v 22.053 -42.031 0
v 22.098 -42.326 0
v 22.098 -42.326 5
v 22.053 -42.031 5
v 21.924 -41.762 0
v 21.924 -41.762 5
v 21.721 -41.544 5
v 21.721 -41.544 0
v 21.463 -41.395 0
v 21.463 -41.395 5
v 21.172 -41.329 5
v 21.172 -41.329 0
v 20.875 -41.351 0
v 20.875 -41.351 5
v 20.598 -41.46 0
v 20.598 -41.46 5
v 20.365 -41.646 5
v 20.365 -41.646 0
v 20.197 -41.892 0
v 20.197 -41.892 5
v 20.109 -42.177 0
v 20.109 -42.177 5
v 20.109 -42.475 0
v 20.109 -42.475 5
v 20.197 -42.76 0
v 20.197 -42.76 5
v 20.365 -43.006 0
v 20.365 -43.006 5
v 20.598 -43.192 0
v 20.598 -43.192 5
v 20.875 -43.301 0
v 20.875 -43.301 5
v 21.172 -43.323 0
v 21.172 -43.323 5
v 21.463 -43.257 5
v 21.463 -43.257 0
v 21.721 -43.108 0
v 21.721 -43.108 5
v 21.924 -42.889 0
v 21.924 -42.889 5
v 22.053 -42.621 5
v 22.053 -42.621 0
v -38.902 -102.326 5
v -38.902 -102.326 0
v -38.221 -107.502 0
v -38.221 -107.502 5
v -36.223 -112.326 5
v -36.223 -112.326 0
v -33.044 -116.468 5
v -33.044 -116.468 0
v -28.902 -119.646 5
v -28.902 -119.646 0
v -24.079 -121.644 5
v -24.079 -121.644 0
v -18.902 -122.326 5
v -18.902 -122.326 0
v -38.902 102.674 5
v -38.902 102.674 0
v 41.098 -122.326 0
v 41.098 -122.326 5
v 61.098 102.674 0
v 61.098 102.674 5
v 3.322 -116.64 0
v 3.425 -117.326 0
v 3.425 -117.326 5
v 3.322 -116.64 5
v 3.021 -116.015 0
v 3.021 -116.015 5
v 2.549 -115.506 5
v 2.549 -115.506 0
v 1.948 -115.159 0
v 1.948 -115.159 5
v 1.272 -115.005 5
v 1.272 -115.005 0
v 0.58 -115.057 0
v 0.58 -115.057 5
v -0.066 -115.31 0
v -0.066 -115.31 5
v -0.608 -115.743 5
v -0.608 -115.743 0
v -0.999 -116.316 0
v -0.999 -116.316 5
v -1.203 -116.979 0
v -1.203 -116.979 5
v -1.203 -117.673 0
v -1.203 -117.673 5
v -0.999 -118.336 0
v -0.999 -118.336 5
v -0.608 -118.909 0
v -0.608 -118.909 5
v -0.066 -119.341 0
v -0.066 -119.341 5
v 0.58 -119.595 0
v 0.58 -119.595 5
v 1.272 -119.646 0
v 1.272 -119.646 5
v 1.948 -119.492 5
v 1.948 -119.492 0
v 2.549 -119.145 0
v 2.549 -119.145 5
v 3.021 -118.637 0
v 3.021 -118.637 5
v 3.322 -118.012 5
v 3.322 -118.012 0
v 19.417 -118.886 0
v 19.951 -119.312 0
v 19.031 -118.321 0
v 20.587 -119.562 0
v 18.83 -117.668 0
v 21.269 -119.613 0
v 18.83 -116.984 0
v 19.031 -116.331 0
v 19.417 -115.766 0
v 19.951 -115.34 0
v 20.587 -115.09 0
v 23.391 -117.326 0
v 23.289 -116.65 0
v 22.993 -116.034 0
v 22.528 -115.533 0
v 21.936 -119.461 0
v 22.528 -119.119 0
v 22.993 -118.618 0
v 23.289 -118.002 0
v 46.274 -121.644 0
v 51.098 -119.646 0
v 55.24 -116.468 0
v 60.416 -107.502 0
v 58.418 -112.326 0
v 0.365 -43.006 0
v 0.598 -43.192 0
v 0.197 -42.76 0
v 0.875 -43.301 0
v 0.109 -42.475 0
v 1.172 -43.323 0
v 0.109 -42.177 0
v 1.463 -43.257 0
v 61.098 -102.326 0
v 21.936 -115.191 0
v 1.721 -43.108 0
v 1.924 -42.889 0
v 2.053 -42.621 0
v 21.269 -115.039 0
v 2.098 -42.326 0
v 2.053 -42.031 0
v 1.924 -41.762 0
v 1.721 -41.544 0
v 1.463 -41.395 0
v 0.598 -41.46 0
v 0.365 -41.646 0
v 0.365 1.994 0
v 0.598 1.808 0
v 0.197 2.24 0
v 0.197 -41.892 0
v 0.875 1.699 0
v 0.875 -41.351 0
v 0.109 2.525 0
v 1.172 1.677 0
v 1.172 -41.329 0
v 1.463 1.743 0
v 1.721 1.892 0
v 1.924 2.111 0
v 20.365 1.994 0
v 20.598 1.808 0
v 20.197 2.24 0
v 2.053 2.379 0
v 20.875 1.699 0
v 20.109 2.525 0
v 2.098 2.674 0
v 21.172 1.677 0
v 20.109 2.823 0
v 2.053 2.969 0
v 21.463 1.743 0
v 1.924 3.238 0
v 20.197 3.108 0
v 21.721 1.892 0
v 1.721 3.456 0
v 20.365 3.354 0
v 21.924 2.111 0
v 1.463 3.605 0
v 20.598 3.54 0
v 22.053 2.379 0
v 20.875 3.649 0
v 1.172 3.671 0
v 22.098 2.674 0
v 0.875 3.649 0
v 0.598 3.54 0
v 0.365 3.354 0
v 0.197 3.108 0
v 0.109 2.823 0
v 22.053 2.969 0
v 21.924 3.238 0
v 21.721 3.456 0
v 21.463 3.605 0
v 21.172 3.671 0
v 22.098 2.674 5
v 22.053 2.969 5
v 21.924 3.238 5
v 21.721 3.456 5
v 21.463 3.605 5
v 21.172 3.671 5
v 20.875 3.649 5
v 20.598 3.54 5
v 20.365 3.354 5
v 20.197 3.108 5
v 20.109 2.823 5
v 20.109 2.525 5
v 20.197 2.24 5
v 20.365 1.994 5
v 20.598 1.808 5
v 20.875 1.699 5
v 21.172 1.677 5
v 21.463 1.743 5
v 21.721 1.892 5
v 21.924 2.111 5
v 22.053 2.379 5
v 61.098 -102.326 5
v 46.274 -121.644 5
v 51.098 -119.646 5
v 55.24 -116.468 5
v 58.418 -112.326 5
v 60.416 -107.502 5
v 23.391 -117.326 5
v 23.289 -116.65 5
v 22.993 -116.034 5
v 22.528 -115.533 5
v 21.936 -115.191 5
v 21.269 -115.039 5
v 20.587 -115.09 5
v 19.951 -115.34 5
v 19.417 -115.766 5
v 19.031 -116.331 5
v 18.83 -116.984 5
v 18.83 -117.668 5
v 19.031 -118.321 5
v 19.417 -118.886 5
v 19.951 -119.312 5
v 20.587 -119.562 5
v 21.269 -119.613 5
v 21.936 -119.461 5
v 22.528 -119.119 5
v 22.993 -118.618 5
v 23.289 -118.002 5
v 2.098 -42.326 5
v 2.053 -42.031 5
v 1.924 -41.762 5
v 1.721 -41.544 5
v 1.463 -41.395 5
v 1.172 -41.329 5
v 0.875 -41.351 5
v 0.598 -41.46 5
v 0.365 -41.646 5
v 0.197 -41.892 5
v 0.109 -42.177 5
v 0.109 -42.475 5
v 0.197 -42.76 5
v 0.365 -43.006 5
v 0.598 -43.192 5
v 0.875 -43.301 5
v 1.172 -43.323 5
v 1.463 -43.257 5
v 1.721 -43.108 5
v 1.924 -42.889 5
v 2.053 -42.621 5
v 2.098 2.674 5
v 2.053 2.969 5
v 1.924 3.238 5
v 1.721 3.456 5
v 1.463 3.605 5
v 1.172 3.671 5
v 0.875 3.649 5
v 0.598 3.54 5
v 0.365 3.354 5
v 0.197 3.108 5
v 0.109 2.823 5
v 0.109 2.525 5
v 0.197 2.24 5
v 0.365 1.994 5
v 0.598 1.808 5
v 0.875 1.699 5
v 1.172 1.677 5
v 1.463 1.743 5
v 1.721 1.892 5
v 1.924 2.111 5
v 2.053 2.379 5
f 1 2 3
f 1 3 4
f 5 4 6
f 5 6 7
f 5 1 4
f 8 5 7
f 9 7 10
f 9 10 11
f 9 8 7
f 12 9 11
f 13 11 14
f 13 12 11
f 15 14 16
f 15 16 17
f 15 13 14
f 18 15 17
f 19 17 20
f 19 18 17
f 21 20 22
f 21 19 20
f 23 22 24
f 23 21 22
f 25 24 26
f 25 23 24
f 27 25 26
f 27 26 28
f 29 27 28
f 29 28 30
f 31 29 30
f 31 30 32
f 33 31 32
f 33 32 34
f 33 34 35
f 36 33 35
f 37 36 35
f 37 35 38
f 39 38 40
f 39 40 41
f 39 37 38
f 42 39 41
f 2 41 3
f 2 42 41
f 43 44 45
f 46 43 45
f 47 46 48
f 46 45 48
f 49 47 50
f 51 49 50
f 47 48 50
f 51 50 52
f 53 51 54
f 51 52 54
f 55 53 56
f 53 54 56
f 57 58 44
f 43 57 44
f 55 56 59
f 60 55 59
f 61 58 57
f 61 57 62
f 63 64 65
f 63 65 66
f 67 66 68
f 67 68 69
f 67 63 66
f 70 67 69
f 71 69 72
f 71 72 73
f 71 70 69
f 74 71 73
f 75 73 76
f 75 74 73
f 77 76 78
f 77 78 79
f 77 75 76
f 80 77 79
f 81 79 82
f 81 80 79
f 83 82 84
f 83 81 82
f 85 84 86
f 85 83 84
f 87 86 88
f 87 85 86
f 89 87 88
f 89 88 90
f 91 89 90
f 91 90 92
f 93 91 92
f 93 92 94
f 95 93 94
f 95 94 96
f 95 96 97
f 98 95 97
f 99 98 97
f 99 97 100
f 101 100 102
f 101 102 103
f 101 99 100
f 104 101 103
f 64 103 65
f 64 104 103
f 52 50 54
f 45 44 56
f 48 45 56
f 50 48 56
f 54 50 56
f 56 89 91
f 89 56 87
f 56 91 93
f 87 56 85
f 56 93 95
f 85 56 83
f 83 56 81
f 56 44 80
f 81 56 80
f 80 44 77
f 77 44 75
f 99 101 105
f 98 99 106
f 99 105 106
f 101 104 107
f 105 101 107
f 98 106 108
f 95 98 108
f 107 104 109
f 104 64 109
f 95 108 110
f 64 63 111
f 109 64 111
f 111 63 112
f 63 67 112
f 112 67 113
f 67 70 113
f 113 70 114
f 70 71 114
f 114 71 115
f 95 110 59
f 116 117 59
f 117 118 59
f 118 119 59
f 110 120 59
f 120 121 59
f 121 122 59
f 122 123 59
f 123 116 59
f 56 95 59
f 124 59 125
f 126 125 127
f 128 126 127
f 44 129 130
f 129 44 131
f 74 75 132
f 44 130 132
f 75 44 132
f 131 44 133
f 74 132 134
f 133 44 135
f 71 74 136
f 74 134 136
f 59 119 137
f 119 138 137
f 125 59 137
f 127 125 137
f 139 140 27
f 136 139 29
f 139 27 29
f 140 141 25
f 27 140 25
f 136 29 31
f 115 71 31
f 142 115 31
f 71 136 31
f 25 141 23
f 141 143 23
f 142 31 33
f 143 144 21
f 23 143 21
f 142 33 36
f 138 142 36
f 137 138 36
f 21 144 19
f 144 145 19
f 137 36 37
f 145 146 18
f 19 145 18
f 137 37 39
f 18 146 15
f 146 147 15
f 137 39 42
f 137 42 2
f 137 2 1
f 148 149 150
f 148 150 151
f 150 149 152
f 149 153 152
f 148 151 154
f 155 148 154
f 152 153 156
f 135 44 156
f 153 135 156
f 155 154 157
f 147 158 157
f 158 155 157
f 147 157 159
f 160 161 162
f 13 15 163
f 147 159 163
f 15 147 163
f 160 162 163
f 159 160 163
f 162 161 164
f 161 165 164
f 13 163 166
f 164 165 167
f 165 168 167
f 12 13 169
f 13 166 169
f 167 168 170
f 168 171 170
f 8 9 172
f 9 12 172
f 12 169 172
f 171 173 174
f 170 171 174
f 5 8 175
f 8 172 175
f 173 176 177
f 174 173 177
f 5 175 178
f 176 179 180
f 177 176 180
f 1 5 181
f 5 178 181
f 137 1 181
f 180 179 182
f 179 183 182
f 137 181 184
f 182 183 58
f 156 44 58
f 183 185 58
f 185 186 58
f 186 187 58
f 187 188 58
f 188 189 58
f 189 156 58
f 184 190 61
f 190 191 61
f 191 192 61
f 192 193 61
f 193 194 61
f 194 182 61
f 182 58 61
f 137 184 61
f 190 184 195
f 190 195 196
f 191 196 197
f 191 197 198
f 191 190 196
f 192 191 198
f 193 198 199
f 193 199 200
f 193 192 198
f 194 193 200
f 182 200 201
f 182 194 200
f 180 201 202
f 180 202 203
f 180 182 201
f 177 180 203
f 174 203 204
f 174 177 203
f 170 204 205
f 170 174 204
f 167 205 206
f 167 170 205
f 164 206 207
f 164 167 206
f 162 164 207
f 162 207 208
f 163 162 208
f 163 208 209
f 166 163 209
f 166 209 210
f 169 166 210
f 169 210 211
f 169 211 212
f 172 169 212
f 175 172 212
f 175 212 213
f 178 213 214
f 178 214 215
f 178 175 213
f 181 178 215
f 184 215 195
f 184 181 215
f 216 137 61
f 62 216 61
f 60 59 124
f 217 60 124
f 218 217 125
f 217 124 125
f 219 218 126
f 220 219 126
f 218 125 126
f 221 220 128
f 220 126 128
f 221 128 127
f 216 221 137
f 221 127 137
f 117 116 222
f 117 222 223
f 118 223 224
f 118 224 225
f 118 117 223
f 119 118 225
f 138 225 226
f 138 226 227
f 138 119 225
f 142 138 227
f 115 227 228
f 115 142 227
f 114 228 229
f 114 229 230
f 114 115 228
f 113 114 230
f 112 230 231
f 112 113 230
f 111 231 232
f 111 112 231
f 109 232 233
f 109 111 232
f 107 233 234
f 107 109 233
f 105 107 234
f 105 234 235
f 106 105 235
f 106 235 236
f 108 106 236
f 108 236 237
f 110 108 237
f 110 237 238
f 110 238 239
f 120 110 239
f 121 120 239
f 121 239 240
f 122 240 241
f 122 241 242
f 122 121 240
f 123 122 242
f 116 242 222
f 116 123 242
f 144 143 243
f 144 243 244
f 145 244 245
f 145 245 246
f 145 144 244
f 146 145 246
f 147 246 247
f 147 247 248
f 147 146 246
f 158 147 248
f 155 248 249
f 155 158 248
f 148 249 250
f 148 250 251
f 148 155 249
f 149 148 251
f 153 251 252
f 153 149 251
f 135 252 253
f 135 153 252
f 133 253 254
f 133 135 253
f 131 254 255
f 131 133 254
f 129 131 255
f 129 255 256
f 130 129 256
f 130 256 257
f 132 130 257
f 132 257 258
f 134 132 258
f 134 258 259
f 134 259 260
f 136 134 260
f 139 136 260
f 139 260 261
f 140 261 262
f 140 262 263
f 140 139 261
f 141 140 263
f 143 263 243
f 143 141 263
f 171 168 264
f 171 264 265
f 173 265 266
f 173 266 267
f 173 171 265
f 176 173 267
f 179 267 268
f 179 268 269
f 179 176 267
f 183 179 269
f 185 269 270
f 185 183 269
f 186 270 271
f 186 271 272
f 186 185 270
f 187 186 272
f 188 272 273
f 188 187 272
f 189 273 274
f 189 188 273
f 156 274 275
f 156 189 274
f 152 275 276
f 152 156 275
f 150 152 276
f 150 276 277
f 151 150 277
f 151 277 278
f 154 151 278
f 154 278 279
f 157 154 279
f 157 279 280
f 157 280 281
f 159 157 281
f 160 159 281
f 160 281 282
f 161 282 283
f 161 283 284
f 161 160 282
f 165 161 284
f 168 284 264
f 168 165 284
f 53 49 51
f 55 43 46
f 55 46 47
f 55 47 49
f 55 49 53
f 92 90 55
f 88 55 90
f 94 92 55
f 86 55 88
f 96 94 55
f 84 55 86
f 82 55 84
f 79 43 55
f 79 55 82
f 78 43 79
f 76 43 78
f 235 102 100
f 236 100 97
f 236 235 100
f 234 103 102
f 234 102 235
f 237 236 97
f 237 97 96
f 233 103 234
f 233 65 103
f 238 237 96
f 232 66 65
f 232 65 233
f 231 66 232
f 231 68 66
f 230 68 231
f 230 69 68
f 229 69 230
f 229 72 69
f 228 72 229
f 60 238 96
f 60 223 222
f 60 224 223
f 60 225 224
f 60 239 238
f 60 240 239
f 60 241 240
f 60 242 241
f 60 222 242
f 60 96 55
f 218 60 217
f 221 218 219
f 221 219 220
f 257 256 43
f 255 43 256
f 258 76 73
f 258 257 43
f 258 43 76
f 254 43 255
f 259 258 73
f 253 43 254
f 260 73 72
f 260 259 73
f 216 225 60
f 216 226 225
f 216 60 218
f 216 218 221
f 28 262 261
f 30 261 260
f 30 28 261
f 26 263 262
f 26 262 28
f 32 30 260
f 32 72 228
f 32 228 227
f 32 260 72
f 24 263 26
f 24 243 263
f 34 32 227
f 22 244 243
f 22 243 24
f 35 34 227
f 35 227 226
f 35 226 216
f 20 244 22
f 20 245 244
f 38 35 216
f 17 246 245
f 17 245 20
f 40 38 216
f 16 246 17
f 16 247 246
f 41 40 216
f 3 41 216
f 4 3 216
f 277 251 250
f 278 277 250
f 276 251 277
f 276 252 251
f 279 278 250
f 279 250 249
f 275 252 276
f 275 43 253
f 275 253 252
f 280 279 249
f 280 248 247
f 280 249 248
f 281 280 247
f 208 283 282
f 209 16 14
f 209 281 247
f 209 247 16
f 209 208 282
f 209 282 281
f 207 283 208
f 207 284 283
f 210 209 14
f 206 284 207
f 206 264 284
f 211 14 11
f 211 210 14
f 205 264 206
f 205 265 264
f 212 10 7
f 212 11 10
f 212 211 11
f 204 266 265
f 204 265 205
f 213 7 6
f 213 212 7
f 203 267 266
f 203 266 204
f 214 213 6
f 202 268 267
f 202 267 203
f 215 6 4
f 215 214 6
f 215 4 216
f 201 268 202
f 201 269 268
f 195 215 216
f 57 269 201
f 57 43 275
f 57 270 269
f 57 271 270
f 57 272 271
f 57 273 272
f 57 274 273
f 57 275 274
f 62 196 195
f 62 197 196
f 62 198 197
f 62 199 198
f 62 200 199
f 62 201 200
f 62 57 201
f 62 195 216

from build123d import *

# Parameters (mm, degrees)
F0_W     = 100
F0_H     = 90
F0_H_2   = 95
F0_R     = 1
F0_R_2   = 2.327232
F0_R_3   = 2.29342
F1_DEPTH = 5


with BuildPart() as f1:
    # F0 (on Top) → F1 (new body)
    with BuildSketch(Plane.XY):
        with Locations((11.097754, 57.674246)):
            Rectangle(F0_W, F0_H)
        with Locations((11.097754, -34.825754)):
            Rectangle(F0_W, F0_H_2)
        with Locations((1.097754, -42.325754)):
            Circle(F0_R, mode=Mode.SUBTRACT)
        with Locations((21.097754, -42.325754)):
            Circle(F0_R, mode=Mode.SUBTRACT)
        with Locations((1.097754, 2.674246)):
            Circle(F0_R, mode=Mode.SUBTRACT)
        with Locations((21.097754, 2.674246)):
            Circle(F0_R, mode=Mode.SUBTRACT)
        with BuildLine():
            Line((61.097754, -82.325754), (-38.902246, -82.325754))
            Line((-38.902246, -82.325754), (-38.902246, -102.325754))
            ThreePointArc((-38.902246, -102.325754), (-33.044382, -116.46789), (-18.902246, -122.325754))
            Line((-18.902246, -122.325754), (41.097754, -122.325754))
            ThreePointArc((41.097754, -122.325754), (55.239889, -116.46789), (61.097754, -102.325754))
            Line((61.097754, -102.325754), (61.097754, -82.325754))
        make_face()
        with Locations((1.097754, -117.325754)):
            Circle(F0_R_2, mode=Mode.SUBTRACT)
        with Locations((21.097754, -117.325754)):
            Circle(F0_R_3, mode=Mode.SUBTRACT)
    extrude(amount=F1_DEPTH)


solid = f1.part
